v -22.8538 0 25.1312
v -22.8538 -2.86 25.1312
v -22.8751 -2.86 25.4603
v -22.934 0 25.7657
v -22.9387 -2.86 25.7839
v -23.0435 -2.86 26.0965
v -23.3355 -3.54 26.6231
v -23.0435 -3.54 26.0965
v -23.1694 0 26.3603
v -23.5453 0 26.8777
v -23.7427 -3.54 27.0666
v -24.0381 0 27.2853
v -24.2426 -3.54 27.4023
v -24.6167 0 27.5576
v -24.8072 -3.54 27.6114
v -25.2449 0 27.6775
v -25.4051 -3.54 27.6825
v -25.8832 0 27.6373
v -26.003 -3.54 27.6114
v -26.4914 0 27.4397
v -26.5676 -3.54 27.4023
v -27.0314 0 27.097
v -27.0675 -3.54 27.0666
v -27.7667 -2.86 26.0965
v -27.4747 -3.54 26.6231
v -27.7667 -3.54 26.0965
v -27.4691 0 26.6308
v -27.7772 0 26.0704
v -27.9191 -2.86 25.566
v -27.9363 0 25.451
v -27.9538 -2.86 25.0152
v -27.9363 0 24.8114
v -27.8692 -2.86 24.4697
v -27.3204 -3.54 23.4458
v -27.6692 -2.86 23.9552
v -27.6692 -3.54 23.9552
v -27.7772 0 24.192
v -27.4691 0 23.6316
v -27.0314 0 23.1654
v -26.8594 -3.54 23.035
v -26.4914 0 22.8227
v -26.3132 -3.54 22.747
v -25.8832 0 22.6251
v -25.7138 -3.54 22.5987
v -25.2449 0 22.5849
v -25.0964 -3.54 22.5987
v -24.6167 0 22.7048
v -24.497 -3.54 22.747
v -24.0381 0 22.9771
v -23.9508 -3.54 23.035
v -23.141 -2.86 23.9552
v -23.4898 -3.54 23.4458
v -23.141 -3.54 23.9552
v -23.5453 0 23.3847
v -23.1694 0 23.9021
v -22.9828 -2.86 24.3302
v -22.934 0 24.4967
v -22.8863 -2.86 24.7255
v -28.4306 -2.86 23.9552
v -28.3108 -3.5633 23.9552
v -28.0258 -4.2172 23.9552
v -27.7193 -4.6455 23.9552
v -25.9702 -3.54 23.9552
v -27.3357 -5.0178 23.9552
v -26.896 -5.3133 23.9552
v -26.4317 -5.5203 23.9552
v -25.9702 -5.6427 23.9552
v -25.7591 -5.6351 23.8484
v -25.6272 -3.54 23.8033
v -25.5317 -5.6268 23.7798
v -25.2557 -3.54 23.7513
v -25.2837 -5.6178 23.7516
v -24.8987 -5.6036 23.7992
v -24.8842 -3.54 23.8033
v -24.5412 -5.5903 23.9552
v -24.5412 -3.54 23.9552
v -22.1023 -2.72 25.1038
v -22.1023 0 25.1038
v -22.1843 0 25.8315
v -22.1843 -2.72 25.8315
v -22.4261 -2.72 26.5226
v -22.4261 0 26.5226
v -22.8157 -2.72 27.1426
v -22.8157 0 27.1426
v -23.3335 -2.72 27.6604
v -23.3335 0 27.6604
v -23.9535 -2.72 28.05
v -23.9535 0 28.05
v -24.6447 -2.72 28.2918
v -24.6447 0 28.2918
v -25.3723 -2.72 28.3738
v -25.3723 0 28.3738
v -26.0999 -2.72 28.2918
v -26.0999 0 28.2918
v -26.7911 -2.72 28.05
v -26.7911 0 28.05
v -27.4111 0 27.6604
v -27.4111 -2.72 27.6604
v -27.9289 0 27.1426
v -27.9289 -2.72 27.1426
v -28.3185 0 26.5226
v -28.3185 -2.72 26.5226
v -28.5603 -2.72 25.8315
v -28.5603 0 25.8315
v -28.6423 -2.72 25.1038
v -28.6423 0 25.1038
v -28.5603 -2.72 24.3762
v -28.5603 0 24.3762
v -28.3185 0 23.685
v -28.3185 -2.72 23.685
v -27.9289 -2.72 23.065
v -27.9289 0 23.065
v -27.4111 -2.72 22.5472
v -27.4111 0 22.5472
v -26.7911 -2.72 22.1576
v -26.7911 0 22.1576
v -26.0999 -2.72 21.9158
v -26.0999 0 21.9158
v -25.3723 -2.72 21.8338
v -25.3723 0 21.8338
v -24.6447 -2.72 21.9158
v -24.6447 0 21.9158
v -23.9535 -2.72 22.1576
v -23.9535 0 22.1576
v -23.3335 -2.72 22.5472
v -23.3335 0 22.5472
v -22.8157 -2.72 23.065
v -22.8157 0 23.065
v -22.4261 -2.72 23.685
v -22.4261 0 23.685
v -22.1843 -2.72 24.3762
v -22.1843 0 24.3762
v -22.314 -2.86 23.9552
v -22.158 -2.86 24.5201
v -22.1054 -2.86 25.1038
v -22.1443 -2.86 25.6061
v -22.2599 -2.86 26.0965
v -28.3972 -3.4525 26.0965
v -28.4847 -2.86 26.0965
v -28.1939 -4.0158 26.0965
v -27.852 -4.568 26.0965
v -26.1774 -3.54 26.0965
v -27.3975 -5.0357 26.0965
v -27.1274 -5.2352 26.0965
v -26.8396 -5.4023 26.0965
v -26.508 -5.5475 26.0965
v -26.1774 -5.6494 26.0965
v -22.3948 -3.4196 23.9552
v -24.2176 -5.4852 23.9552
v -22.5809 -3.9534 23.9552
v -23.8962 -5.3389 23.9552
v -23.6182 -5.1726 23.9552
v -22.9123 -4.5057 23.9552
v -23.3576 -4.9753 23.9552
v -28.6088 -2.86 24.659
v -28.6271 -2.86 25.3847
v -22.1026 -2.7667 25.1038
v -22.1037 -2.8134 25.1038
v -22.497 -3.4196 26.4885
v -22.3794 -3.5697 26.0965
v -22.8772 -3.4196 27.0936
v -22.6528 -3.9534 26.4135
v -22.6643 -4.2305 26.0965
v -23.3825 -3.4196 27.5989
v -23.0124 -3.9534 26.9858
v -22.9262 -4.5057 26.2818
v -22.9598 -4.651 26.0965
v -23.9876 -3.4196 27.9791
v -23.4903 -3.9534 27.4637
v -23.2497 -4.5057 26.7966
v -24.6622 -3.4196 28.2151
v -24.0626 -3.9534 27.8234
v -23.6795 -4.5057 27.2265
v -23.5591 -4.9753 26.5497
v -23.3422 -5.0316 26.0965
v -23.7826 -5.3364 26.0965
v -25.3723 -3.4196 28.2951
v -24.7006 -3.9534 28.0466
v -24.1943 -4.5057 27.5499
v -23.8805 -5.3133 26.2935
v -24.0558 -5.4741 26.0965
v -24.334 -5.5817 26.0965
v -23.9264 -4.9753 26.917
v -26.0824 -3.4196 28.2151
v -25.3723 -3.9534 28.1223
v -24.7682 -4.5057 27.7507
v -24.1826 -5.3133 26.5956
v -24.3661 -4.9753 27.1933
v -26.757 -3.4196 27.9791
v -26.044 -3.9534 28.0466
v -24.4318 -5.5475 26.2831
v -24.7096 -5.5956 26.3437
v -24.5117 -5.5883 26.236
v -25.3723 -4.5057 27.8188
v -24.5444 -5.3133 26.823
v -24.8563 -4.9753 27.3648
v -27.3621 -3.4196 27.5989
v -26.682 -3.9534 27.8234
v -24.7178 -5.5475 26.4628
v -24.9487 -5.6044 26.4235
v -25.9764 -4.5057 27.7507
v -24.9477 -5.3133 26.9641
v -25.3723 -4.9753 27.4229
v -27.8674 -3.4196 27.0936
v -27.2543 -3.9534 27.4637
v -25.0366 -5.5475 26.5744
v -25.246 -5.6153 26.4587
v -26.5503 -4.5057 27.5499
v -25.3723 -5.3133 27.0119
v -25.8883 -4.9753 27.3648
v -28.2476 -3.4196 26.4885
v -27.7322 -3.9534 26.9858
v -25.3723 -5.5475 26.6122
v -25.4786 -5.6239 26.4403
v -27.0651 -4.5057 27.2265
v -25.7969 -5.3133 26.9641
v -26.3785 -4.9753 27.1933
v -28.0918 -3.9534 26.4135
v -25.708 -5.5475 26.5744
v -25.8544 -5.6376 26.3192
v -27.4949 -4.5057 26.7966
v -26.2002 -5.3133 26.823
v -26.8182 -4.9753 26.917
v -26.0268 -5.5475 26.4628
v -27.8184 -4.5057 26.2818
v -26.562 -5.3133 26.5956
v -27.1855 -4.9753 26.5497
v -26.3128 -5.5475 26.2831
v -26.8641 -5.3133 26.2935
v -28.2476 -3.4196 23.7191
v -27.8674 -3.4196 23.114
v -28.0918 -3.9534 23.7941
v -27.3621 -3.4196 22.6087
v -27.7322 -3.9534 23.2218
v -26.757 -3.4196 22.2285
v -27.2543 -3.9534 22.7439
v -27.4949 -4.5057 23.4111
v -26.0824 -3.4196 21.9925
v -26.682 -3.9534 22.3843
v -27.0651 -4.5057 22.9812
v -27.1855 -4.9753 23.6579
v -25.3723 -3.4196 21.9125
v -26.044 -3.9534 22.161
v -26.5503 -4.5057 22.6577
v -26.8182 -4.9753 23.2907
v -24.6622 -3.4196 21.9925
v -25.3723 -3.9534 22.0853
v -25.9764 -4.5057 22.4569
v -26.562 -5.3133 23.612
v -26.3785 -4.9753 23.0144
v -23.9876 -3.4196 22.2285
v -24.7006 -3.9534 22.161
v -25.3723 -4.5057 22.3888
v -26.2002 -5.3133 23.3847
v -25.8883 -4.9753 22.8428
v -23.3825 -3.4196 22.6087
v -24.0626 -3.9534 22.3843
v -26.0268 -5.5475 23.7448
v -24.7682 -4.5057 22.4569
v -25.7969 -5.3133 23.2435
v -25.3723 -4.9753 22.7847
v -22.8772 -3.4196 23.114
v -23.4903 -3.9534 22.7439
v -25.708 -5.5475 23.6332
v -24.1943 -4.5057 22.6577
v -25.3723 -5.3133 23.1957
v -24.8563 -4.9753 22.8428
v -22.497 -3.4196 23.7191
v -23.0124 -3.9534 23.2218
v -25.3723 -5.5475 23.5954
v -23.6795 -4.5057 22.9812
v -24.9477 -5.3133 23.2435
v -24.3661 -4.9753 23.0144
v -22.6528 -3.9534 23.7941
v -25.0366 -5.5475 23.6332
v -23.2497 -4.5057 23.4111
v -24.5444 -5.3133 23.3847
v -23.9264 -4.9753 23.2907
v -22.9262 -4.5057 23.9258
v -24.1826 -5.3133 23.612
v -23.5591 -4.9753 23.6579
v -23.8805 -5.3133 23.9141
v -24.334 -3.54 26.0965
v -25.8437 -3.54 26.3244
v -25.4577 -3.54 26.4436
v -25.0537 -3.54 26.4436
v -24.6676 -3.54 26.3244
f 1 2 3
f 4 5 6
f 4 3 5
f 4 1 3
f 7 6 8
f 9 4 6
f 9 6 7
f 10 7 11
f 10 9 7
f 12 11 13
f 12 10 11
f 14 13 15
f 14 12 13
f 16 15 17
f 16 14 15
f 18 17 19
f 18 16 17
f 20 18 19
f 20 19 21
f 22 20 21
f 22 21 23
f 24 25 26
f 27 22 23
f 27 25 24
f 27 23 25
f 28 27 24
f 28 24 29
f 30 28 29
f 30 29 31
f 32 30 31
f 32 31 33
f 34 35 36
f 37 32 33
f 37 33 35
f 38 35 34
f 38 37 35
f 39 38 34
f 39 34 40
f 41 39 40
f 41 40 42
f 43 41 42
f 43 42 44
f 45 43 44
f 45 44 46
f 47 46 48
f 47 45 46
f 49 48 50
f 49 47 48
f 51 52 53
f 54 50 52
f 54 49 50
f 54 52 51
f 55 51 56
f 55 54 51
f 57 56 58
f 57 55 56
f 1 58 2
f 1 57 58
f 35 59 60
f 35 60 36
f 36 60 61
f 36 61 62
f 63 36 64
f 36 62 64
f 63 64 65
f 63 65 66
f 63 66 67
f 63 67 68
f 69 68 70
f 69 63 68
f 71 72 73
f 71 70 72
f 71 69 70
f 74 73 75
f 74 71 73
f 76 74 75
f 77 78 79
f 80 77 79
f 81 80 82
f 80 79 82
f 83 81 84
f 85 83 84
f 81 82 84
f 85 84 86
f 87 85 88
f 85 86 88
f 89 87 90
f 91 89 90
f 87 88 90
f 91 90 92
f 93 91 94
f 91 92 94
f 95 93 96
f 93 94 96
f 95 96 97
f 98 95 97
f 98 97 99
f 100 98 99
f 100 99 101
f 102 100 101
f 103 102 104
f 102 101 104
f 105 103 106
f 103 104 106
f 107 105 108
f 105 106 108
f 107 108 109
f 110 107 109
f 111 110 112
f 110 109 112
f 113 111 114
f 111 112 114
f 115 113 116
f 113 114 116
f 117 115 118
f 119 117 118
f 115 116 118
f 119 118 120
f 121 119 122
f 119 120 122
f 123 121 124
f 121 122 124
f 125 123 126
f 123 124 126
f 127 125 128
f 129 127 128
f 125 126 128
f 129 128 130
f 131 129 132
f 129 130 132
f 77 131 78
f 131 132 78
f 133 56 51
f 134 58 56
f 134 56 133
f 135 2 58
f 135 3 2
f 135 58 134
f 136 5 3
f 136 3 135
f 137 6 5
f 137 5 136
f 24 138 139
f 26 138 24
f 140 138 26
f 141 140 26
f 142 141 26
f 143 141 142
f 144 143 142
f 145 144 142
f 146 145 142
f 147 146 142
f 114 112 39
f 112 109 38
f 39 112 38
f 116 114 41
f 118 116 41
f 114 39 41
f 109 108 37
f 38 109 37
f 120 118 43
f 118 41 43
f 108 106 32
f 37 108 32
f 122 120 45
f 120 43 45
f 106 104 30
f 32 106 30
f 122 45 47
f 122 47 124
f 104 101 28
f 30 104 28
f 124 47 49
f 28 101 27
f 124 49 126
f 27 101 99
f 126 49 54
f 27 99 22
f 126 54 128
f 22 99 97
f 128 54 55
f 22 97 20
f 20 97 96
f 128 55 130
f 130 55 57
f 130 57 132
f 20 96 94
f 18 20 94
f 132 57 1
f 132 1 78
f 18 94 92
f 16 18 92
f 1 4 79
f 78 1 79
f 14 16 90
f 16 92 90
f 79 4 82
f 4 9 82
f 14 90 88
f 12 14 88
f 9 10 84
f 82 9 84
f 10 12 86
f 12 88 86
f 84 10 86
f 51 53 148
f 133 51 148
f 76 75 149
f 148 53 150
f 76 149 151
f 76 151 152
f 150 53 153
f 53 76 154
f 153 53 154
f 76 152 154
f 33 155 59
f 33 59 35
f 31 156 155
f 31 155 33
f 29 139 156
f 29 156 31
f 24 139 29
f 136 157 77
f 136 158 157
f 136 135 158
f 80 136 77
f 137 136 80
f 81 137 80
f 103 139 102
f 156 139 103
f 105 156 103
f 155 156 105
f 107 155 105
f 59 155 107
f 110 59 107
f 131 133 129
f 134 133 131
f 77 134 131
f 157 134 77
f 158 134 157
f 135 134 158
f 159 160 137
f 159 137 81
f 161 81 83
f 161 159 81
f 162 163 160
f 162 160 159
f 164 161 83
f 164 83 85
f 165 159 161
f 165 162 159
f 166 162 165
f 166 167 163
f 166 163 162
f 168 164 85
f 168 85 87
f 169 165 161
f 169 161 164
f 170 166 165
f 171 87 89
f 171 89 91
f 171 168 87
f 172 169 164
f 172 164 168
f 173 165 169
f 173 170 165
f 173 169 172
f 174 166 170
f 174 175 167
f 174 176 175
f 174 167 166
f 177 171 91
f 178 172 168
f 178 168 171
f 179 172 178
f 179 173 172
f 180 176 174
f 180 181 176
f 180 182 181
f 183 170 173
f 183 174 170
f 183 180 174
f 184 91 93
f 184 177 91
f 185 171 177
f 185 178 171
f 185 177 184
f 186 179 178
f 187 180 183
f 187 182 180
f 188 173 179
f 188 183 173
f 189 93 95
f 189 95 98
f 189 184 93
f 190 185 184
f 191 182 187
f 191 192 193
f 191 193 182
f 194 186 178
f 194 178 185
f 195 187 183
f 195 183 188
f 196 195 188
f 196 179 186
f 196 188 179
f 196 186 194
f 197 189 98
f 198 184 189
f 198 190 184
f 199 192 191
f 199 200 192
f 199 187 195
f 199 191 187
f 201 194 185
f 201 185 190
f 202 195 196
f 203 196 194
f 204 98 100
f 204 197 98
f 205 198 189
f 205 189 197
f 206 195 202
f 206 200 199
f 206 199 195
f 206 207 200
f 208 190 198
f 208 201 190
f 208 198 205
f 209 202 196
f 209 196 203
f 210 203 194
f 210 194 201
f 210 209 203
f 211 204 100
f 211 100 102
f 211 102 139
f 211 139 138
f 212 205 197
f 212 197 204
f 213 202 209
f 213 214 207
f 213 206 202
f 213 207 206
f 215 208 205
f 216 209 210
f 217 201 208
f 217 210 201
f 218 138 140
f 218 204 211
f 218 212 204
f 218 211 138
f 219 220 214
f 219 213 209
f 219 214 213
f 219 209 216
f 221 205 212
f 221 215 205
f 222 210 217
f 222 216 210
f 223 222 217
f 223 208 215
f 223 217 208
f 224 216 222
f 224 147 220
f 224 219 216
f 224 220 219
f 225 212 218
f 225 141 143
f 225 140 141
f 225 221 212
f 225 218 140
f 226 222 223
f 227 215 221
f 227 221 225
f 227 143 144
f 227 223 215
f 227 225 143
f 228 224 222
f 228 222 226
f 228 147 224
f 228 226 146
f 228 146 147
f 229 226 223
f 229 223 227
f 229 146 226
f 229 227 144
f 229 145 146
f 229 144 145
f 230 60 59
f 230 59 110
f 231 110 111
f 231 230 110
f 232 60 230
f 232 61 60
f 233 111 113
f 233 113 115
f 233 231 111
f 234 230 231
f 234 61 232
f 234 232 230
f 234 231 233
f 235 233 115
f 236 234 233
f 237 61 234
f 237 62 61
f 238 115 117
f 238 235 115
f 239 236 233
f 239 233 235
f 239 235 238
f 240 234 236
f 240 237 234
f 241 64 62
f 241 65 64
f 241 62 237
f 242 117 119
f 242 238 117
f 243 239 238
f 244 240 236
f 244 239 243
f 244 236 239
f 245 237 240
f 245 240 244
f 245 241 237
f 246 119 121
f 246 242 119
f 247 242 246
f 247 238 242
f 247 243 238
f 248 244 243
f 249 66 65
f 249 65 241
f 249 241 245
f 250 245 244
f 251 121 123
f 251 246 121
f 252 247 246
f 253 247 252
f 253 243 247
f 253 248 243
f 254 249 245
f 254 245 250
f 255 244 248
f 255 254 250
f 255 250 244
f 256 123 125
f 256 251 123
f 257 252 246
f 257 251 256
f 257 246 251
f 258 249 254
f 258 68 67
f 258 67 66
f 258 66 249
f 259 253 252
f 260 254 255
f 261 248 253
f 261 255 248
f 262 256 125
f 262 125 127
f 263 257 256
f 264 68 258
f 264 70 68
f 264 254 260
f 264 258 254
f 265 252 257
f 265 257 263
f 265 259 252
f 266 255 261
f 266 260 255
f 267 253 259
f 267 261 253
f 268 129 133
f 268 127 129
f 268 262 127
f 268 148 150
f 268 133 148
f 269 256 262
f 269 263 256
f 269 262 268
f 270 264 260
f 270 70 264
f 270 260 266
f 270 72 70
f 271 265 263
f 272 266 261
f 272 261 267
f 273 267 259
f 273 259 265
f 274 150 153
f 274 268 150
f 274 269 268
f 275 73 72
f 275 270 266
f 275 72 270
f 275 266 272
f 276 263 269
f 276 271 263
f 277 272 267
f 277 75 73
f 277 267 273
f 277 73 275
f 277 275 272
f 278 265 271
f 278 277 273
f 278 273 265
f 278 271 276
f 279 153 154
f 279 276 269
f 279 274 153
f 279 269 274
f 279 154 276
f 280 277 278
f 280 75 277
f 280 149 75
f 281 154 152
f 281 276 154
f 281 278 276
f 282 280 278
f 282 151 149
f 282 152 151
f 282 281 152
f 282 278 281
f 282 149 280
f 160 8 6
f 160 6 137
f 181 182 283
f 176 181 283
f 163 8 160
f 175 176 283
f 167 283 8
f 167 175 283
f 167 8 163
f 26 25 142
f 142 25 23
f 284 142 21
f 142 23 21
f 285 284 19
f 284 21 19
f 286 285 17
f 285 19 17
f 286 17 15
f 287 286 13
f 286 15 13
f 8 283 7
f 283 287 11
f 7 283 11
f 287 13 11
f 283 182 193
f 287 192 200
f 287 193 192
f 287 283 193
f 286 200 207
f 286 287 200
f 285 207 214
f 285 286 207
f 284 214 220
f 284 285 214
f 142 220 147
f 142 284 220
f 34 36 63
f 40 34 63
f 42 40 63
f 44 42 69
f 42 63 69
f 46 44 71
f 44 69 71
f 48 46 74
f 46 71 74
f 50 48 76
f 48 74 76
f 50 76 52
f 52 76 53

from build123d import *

# Parameters (mm, degrees)
F0_R     = 3.27
F1_DEPTH = 5.87
F2_R     = 3.15
F3_W     = 12.847729
F3_H     = 2.14129
F4_DEPTH = 3.01
F5_R     = 1.353715
F6_DEPTH = 25.4
F7_R     = 2.551292
F8_DEPTH = 3.54


with BuildPart() as f1:
    # F0 (on Front) → F1 (new body)
    with BuildSketch(Plane.XZ):
        with Locations((-25.3723, 25.103809)):
            Circle(F0_R)
    extrude(amount=F1_DEPTH)

    # F2
    f2_edges = [f1.edges().sort_by_distance(p)[0] for p in [
        (-28.6423, -5.87, 25.103809),
    ]]
    fillet(f2_edges, radius=F2_R)

    # F3 (on face) → F4 (cut)
    with BuildSketch(Plane.XZ.offset(5.87)):
        with Locations((-25.525428, 25.025891)):
            Rectangle(F3_W, F3_H)
    extrude(amount=-F4_DEPTH, mode=Mode.SUBTRACT)

    # F5 (on Front) → F6 (cut)
    with BuildSketch(Plane.XZ):
        with Locations((-25.255676, 25.105048)):
            Circle(F5_R)
    extrude(amount=F6_DEPTH, mode=Mode.SUBTRACT)

    # F7 (on Front) → F8 (cut)
    with BuildSketch(Plane.XZ):
        with Locations((-25.405101, 25.131198)):
            Circle(F7_R)
    extrude(amount=F8_DEPTH, mode=Mode.SUBTRACT)


solid = f1.part
